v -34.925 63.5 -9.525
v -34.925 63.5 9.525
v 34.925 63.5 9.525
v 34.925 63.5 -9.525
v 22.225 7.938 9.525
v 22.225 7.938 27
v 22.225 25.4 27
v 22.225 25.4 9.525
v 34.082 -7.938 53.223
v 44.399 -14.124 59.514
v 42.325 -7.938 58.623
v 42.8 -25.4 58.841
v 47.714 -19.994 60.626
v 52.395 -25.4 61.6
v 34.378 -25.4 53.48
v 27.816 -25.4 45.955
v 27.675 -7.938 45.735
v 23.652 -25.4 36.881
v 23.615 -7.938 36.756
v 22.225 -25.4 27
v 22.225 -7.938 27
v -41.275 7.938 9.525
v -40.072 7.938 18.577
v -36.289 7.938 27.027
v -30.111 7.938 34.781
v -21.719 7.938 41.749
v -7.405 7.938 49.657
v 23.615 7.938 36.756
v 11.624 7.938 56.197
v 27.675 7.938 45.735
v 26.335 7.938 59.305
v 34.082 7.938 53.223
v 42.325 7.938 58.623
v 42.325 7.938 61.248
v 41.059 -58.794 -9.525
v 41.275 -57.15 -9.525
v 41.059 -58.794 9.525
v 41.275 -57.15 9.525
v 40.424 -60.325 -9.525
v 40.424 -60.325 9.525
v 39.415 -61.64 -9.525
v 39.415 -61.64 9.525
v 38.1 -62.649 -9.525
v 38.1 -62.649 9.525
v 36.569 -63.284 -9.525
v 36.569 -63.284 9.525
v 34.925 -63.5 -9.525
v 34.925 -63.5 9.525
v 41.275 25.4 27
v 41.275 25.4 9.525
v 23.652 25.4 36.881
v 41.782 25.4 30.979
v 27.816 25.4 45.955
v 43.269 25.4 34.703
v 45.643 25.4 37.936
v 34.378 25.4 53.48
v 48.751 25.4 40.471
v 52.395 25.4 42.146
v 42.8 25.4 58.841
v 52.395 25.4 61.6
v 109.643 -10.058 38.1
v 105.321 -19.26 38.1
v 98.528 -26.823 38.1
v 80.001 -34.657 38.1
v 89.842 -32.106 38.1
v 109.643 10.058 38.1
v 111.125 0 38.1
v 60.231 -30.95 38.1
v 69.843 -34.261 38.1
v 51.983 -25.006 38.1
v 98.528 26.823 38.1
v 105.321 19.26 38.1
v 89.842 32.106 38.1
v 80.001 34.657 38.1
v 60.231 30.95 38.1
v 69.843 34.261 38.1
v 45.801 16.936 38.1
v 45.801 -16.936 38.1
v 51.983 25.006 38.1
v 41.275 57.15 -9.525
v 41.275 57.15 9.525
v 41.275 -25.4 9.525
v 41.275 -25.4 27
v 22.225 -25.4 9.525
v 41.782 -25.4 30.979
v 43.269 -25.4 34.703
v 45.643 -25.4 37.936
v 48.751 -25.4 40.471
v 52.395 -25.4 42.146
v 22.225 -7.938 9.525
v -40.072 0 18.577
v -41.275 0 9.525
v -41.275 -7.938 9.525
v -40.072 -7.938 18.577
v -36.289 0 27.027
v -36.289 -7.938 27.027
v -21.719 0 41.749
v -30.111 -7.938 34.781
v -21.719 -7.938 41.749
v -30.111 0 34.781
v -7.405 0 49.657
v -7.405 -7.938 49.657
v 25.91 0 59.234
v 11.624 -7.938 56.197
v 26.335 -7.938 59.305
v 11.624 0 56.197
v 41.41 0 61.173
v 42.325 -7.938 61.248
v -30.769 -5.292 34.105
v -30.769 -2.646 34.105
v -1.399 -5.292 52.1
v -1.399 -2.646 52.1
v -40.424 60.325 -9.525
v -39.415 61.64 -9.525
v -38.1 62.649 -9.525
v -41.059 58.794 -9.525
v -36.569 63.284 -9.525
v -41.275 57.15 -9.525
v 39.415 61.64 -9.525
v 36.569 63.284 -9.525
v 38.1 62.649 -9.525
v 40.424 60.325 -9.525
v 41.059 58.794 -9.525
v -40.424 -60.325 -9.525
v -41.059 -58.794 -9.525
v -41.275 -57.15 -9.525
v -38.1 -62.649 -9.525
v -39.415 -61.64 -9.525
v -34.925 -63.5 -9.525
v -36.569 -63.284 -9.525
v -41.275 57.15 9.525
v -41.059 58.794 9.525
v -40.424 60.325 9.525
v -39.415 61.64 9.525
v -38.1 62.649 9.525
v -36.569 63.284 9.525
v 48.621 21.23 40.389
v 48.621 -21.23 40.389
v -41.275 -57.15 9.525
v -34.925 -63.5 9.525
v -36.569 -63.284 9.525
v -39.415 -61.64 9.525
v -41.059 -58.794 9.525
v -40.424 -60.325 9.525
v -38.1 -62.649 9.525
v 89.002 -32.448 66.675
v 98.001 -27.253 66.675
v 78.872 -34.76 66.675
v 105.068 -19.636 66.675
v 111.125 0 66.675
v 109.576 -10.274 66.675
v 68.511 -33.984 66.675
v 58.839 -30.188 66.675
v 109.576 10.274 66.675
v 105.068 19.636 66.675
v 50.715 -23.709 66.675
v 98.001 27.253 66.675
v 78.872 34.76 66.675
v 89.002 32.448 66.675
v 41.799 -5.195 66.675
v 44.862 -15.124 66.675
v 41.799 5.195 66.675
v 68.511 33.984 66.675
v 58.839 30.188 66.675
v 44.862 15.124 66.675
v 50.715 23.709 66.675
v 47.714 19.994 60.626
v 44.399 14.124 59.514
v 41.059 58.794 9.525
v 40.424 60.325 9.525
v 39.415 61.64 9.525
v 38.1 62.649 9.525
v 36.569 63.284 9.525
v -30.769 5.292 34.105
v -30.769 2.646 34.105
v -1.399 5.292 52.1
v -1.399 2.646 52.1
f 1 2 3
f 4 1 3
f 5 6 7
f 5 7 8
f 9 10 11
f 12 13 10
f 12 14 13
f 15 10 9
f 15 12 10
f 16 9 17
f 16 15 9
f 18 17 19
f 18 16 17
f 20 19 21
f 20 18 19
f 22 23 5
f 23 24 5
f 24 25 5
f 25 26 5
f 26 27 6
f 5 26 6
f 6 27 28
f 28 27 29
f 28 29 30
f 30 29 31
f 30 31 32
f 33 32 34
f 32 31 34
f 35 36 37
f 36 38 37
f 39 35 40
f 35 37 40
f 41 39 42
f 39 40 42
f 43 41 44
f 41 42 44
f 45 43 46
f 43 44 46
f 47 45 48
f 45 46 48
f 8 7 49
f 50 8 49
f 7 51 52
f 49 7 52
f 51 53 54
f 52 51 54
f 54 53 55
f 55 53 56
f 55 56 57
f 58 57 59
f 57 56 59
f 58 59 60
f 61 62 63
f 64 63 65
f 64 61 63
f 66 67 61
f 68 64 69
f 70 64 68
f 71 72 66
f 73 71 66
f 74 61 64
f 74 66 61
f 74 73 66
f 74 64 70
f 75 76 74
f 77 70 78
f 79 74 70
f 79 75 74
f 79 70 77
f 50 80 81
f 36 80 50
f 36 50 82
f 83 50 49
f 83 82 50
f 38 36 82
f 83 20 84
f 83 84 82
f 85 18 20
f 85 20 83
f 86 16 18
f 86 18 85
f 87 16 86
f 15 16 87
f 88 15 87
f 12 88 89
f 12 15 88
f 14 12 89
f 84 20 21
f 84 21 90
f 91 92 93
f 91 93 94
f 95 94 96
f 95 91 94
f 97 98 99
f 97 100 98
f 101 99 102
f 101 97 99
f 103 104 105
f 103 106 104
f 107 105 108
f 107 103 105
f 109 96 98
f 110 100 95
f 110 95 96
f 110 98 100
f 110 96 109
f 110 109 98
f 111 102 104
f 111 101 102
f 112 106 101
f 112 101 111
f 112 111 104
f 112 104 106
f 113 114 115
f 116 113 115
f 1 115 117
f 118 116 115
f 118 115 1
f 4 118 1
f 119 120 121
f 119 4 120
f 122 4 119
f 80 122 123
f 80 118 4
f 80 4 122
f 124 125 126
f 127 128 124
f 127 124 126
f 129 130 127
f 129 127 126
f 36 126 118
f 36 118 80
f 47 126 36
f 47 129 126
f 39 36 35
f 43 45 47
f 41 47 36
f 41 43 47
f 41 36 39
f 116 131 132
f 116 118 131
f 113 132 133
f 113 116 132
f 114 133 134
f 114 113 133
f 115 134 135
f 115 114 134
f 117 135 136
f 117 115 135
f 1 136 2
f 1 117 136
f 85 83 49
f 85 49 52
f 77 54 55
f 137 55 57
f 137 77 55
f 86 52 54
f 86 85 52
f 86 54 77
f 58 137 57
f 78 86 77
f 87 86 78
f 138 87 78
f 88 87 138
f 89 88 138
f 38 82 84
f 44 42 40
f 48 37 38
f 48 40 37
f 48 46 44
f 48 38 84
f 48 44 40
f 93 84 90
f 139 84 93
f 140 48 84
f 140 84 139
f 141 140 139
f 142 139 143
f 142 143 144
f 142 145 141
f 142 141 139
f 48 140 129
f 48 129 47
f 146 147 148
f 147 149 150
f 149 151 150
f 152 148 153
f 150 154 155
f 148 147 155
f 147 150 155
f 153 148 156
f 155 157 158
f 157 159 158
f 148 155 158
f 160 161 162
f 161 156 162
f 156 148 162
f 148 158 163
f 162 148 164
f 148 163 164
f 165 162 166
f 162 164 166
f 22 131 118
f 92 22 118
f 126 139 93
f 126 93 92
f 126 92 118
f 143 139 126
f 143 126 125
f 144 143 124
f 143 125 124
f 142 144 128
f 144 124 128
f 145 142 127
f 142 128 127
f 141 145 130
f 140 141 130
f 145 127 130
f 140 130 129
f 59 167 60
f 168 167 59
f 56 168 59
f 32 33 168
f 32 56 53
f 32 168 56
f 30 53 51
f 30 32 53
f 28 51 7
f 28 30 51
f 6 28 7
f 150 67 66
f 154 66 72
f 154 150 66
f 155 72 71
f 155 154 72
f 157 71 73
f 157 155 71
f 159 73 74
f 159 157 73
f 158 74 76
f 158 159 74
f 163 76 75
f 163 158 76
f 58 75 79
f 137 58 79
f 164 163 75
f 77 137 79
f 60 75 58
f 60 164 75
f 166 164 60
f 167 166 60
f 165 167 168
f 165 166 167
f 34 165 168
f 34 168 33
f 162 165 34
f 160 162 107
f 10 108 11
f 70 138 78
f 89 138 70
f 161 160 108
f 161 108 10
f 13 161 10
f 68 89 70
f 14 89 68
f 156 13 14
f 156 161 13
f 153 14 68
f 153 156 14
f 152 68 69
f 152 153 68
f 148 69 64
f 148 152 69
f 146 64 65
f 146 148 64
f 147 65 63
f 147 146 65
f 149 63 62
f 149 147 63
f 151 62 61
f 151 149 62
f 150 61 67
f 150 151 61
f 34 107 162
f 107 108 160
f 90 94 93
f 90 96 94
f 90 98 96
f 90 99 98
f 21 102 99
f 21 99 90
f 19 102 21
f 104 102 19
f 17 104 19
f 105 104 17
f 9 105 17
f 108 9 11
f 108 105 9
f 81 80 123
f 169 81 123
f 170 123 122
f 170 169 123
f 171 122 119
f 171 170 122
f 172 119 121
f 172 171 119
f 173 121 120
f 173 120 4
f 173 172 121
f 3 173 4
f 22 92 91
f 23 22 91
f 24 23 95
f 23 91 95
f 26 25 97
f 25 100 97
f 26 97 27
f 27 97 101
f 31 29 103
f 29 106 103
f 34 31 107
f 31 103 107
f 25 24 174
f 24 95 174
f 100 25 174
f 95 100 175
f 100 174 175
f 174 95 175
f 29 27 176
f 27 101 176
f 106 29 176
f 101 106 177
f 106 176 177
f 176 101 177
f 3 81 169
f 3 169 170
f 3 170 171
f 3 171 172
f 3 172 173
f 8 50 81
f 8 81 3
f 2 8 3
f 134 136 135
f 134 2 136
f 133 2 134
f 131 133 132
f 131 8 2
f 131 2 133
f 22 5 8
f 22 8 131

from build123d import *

# Parameters (mm, degrees)
F1_DEPTH = 63.5
F2_DEPTH = 25.4
F3_DEPTH = 7.9375
F0_W     = 34.8576607108
F0_H     = 28.575
F5_R     = 6.35


with BuildPart() as f1:
    # F0 (on Front) → F1 (new body, symmetric)
    with BuildSketch(Plane.XZ):
        Polygon((41.275, -9.525), (41.275, 9.525), (22.225, 9.525), (-41.275, 9.525), (-41.275, -9.525), align=None)
    extrude(amount=F1_DEPTH, both=True)

    # F0 (on Front) → F2 (join, symmetric)
    with BuildSketch(Plane.XZ):
        with BuildLine():
            Line((22.225, 9.525), (41.275, 9.525))
            Line((41.275, 9.525), (41.275, 27.0002))
            ThreePointArc((41.275, 27.0002), (45.9246798487, 38.2255201513), (57.15, 42.8752))
            Line((57.15, 42.8752), (60.325, 42.8752))
            Line((60.325, 42.8752), (60.325, 61.9252))
            Line((60.325, 61.9252), (57.15, 61.9252))
            add(Edge.make_bspline(
                [(56.1489330391, 61.9108500933), (56.4820916487, 61.9163585196), (56.8157824233, 61.9211427182), (57.15, 61.9252)],
                knots=[110.8524490967, 110.8524490967, 110.8524490967, 110.8524490967, 111.5045361635, 111.5045361635, 111.5045361635, 111.5045361635], degree=3))
            ThreePointArc((56.1489330391, 61.9108500933), (32.102865547, 51.3394004942), (22.225, 27.0002))
            Line((22.225, 27.0002), (22.225, 9.525))
        make_face()
    extrude(amount=F2_DEPTH, both=True)

    # F0 (on Front) → F3 (join, symmetric)
    with BuildSketch(Plane.XZ):
        with BuildLine():
            Line((-41.275, 9.525), (22.225, 9.525))
            Line((22.225, 9.525), (22.225, 27.0002))
            ThreePointArc((22.225, 27.0002), (32.102865547, 51.3394004942), (56.1489330391, 61.9108500933))
            add(Edge.make_bspline(
                [(-41.275, 9.525), (-41.7436731397, 39.1087358459), (-0.4868287897, 60.9744375078), (56.1489330391, 61.9108500933)],
                knots=[0, 0, 0, 0, 110.8524490967, 110.8524490967, 110.8524490967, 110.8524490967], degree=3))
        make_face()
    extrude(amount=F3_DEPTH, both=True)

    # F0 (on Front) → F4 (revolve)
    with BuildSketch(Plane.XZ):
        with Locations((93.6961696446, 52.3875)):
            Rectangle(F0_W, F0_H)
    revolve(axis=Axis((76.2673392892, 0, 52.3875), (0, 0, 1)))

    # F5
    f5_edges = [f1.edges().sort_by_distance(p)[0] for p in [
        (-41.275, -63.5, 0),
        (41.275, -63.5, 0),
        (41.275, 63.5, 0),
        (-41.275, 63.5, 0),
    ]]
    fillet(f5_edges, radius=F5_R)


solid = f1.part
